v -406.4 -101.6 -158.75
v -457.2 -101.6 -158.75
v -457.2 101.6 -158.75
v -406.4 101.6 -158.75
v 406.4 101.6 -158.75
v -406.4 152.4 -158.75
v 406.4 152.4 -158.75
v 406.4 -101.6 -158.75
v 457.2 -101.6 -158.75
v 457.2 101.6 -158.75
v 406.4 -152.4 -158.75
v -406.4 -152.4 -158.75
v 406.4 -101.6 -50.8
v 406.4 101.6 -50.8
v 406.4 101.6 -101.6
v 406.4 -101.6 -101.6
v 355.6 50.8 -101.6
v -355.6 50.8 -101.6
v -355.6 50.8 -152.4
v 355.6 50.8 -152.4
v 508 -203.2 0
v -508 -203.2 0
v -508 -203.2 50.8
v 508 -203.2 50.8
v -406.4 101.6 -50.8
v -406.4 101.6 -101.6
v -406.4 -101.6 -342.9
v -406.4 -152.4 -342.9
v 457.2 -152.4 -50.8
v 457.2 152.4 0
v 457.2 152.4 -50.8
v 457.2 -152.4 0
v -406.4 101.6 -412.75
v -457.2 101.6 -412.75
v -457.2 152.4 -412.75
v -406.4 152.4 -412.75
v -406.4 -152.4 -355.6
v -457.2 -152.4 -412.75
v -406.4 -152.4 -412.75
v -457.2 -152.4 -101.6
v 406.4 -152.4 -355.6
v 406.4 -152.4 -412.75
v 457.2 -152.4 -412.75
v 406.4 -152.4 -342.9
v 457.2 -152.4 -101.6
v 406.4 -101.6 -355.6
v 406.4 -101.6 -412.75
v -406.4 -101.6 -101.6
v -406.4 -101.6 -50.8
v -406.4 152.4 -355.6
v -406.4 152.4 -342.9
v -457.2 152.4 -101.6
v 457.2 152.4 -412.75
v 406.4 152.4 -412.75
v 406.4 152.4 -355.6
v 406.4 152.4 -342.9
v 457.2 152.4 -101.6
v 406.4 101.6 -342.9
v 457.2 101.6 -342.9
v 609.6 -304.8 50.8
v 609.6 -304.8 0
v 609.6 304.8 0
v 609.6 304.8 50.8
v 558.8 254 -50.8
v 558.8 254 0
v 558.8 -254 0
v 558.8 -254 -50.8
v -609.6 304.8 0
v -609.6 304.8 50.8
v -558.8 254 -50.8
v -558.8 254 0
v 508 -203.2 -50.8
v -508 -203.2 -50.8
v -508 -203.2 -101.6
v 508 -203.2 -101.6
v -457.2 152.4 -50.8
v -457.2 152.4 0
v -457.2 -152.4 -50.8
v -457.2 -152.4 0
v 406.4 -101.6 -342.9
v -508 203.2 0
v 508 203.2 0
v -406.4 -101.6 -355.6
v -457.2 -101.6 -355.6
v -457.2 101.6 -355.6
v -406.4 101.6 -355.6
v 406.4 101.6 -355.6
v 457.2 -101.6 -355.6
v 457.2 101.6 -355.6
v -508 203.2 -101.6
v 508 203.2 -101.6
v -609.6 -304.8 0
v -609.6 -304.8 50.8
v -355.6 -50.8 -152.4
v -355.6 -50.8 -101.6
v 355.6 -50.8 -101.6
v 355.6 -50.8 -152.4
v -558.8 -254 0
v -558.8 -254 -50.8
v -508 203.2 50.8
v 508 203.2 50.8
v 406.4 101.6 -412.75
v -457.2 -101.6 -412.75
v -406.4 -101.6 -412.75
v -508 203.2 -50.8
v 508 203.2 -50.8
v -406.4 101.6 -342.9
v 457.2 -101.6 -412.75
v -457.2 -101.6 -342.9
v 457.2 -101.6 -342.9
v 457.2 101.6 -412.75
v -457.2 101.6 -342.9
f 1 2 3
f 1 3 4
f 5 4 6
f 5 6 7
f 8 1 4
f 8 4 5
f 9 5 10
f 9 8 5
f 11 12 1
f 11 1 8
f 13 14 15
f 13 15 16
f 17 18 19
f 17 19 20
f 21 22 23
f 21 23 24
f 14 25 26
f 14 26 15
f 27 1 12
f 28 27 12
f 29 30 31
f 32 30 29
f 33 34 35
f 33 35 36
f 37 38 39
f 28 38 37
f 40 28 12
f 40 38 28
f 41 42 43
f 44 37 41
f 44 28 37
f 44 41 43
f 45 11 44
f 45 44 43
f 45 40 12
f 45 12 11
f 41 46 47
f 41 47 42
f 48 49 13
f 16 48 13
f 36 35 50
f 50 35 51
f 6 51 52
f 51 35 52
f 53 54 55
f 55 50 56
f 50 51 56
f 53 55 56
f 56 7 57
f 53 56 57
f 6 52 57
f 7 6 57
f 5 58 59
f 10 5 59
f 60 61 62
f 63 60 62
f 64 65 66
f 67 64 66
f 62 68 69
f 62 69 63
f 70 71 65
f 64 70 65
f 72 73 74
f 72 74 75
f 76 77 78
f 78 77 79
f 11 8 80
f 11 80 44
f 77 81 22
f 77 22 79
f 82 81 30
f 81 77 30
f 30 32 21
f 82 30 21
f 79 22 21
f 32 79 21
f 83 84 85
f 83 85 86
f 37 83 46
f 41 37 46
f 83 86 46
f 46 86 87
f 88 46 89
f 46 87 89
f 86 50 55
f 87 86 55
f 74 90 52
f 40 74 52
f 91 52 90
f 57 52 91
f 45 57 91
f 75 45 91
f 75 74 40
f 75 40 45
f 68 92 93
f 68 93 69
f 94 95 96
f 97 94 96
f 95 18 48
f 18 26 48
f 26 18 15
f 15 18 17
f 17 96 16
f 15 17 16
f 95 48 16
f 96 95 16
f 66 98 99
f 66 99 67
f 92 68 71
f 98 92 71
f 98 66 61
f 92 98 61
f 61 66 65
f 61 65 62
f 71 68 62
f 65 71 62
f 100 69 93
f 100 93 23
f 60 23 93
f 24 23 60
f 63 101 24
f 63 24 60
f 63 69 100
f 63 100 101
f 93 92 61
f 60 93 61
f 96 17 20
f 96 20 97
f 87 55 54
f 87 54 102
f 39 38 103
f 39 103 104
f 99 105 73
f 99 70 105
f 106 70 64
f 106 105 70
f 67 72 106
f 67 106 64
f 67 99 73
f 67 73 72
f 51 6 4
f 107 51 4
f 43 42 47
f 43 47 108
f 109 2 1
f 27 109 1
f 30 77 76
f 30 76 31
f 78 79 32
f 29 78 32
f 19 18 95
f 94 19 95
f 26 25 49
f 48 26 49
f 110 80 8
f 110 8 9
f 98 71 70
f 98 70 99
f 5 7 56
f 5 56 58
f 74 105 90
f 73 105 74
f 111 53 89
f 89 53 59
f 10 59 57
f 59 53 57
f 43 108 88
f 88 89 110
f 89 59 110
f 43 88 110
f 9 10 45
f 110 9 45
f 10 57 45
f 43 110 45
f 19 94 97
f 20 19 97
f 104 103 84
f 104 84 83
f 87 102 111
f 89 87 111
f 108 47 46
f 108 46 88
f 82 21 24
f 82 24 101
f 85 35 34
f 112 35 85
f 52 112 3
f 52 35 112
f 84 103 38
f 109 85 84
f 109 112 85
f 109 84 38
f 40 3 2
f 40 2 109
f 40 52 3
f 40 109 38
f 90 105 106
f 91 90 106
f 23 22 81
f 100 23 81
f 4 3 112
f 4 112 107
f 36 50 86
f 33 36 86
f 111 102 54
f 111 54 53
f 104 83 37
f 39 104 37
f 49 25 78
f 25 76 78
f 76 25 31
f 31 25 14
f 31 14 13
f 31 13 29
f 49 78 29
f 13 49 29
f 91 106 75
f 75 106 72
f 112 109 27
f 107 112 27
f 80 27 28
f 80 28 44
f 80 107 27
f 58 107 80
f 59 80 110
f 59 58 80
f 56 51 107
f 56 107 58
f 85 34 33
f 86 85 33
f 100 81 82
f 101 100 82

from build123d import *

# Parameters (mm, degrees)
F0_W      = 1219.2
F0_H      = 609.6
F0_W_2    = 1015.999996
F0_H_2    = 406.399996
F1_DEPTH  = 50.8
F2_W      = 1117.6
F2_H      = 508
F2_W_2    = 914.400004
F2_H_2    = 304.800004
F3_DEPTH  = 50.8
F4_W      = 1016
F4_H      = 406.4
F4_W_2    = 812.799998
F4_H_2    = 203.199998
F5_DEPTH  = 50.8
F6_W      = 914.4
F6_H      = 304.8
F6_W_2    = 711.199998
F6_H_2    = 101.599998
F7_DEPTH  = 50.8
F8_W      = 914.4
F8_H      = 304.8
F9_DEPTH  = 6.35
F10_W     = 50.8
F10_H     = 50.8
F11_DEPTH = 254
F13_W     = 914.4
F13_H     = 304.8
F14_DEPTH = 12.7


with BuildPart() as f1:
    # F0 (on Top) → F1 (new body)
    with BuildSketch(Plane.XY):
        Rectangle(F0_W, F0_H)
        Rectangle(F0_W_2, F0_H_2, mode=Mode.SUBTRACT)
    extrude(amount=F1_DEPTH)

    # F2 (on face) → F3 (join)
    with BuildSketch(Plane(origin=(0, 0, 0), x_dir=(1, 0, 0), z_dir=(0, 0, -1))):
        Rectangle(F2_W, F2_H)
        Rectangle(F2_W_2, F2_H_2, mode=Mode.SUBTRACT)
    extrude(amount=F3_DEPTH)

    # F4 (on face) → F5 (join)
    with BuildSketch(Plane(origin=(0, 0, -50.8), x_dir=(1, 0, 0), z_dir=(0, 0, -1))):
        Rectangle(F4_W, F4_H)
        Rectangle(F4_W_2, F4_H_2, mode=Mode.SUBTRACT)
    extrude(amount=F5_DEPTH)

    # F6 (on face) → F7 (join)
    with BuildSketch(Plane(origin=(0, 0, -101.6), x_dir=(1, 0, 0), z_dir=(0, 0, -1))):
        Rectangle(F6_W, F6_H)
        Rectangle(F6_W_2, F6_H_2, mode=Mode.SUBTRACT)
    extrude(amount=F7_DEPTH)

    # F8 (on face) → F9 (join)
    with BuildSketch(Plane(origin=(0, 0, -152.4), x_dir=(1, 0, 0), z_dir=(0, 0, -1))):
        Rectangle(F8_W, F8_H)
    extrude(amount=F9_DEPTH)

    # F10 (on face) → F11 (join)
    with BuildSketch(Plane(origin=(0, 0, -158.75), x_dir=(1, 0, 0), z_dir=(0, 0, -1))):
        with Locations((-431.8, 127)):
            Rectangle(F10_W, F10_H)
        with Locations((-431.8, -127)):
            Rectangle(F10_W, F10_H)
        with Locations((431.8, 127)):
            Rectangle(F10_W, F10_H)
        with Locations((431.8, -127)):
            Rectangle(F10_W, F10_H)
    extrude(amount=F11_DEPTH)

    # F13 (on offset) → F14 (join)
    with BuildSketch(Plane.XY.offset(-355.6)):
        Rectangle(F13_W, F13_H)
    extrude(amount=F14_DEPTH)


solid = f1.part
